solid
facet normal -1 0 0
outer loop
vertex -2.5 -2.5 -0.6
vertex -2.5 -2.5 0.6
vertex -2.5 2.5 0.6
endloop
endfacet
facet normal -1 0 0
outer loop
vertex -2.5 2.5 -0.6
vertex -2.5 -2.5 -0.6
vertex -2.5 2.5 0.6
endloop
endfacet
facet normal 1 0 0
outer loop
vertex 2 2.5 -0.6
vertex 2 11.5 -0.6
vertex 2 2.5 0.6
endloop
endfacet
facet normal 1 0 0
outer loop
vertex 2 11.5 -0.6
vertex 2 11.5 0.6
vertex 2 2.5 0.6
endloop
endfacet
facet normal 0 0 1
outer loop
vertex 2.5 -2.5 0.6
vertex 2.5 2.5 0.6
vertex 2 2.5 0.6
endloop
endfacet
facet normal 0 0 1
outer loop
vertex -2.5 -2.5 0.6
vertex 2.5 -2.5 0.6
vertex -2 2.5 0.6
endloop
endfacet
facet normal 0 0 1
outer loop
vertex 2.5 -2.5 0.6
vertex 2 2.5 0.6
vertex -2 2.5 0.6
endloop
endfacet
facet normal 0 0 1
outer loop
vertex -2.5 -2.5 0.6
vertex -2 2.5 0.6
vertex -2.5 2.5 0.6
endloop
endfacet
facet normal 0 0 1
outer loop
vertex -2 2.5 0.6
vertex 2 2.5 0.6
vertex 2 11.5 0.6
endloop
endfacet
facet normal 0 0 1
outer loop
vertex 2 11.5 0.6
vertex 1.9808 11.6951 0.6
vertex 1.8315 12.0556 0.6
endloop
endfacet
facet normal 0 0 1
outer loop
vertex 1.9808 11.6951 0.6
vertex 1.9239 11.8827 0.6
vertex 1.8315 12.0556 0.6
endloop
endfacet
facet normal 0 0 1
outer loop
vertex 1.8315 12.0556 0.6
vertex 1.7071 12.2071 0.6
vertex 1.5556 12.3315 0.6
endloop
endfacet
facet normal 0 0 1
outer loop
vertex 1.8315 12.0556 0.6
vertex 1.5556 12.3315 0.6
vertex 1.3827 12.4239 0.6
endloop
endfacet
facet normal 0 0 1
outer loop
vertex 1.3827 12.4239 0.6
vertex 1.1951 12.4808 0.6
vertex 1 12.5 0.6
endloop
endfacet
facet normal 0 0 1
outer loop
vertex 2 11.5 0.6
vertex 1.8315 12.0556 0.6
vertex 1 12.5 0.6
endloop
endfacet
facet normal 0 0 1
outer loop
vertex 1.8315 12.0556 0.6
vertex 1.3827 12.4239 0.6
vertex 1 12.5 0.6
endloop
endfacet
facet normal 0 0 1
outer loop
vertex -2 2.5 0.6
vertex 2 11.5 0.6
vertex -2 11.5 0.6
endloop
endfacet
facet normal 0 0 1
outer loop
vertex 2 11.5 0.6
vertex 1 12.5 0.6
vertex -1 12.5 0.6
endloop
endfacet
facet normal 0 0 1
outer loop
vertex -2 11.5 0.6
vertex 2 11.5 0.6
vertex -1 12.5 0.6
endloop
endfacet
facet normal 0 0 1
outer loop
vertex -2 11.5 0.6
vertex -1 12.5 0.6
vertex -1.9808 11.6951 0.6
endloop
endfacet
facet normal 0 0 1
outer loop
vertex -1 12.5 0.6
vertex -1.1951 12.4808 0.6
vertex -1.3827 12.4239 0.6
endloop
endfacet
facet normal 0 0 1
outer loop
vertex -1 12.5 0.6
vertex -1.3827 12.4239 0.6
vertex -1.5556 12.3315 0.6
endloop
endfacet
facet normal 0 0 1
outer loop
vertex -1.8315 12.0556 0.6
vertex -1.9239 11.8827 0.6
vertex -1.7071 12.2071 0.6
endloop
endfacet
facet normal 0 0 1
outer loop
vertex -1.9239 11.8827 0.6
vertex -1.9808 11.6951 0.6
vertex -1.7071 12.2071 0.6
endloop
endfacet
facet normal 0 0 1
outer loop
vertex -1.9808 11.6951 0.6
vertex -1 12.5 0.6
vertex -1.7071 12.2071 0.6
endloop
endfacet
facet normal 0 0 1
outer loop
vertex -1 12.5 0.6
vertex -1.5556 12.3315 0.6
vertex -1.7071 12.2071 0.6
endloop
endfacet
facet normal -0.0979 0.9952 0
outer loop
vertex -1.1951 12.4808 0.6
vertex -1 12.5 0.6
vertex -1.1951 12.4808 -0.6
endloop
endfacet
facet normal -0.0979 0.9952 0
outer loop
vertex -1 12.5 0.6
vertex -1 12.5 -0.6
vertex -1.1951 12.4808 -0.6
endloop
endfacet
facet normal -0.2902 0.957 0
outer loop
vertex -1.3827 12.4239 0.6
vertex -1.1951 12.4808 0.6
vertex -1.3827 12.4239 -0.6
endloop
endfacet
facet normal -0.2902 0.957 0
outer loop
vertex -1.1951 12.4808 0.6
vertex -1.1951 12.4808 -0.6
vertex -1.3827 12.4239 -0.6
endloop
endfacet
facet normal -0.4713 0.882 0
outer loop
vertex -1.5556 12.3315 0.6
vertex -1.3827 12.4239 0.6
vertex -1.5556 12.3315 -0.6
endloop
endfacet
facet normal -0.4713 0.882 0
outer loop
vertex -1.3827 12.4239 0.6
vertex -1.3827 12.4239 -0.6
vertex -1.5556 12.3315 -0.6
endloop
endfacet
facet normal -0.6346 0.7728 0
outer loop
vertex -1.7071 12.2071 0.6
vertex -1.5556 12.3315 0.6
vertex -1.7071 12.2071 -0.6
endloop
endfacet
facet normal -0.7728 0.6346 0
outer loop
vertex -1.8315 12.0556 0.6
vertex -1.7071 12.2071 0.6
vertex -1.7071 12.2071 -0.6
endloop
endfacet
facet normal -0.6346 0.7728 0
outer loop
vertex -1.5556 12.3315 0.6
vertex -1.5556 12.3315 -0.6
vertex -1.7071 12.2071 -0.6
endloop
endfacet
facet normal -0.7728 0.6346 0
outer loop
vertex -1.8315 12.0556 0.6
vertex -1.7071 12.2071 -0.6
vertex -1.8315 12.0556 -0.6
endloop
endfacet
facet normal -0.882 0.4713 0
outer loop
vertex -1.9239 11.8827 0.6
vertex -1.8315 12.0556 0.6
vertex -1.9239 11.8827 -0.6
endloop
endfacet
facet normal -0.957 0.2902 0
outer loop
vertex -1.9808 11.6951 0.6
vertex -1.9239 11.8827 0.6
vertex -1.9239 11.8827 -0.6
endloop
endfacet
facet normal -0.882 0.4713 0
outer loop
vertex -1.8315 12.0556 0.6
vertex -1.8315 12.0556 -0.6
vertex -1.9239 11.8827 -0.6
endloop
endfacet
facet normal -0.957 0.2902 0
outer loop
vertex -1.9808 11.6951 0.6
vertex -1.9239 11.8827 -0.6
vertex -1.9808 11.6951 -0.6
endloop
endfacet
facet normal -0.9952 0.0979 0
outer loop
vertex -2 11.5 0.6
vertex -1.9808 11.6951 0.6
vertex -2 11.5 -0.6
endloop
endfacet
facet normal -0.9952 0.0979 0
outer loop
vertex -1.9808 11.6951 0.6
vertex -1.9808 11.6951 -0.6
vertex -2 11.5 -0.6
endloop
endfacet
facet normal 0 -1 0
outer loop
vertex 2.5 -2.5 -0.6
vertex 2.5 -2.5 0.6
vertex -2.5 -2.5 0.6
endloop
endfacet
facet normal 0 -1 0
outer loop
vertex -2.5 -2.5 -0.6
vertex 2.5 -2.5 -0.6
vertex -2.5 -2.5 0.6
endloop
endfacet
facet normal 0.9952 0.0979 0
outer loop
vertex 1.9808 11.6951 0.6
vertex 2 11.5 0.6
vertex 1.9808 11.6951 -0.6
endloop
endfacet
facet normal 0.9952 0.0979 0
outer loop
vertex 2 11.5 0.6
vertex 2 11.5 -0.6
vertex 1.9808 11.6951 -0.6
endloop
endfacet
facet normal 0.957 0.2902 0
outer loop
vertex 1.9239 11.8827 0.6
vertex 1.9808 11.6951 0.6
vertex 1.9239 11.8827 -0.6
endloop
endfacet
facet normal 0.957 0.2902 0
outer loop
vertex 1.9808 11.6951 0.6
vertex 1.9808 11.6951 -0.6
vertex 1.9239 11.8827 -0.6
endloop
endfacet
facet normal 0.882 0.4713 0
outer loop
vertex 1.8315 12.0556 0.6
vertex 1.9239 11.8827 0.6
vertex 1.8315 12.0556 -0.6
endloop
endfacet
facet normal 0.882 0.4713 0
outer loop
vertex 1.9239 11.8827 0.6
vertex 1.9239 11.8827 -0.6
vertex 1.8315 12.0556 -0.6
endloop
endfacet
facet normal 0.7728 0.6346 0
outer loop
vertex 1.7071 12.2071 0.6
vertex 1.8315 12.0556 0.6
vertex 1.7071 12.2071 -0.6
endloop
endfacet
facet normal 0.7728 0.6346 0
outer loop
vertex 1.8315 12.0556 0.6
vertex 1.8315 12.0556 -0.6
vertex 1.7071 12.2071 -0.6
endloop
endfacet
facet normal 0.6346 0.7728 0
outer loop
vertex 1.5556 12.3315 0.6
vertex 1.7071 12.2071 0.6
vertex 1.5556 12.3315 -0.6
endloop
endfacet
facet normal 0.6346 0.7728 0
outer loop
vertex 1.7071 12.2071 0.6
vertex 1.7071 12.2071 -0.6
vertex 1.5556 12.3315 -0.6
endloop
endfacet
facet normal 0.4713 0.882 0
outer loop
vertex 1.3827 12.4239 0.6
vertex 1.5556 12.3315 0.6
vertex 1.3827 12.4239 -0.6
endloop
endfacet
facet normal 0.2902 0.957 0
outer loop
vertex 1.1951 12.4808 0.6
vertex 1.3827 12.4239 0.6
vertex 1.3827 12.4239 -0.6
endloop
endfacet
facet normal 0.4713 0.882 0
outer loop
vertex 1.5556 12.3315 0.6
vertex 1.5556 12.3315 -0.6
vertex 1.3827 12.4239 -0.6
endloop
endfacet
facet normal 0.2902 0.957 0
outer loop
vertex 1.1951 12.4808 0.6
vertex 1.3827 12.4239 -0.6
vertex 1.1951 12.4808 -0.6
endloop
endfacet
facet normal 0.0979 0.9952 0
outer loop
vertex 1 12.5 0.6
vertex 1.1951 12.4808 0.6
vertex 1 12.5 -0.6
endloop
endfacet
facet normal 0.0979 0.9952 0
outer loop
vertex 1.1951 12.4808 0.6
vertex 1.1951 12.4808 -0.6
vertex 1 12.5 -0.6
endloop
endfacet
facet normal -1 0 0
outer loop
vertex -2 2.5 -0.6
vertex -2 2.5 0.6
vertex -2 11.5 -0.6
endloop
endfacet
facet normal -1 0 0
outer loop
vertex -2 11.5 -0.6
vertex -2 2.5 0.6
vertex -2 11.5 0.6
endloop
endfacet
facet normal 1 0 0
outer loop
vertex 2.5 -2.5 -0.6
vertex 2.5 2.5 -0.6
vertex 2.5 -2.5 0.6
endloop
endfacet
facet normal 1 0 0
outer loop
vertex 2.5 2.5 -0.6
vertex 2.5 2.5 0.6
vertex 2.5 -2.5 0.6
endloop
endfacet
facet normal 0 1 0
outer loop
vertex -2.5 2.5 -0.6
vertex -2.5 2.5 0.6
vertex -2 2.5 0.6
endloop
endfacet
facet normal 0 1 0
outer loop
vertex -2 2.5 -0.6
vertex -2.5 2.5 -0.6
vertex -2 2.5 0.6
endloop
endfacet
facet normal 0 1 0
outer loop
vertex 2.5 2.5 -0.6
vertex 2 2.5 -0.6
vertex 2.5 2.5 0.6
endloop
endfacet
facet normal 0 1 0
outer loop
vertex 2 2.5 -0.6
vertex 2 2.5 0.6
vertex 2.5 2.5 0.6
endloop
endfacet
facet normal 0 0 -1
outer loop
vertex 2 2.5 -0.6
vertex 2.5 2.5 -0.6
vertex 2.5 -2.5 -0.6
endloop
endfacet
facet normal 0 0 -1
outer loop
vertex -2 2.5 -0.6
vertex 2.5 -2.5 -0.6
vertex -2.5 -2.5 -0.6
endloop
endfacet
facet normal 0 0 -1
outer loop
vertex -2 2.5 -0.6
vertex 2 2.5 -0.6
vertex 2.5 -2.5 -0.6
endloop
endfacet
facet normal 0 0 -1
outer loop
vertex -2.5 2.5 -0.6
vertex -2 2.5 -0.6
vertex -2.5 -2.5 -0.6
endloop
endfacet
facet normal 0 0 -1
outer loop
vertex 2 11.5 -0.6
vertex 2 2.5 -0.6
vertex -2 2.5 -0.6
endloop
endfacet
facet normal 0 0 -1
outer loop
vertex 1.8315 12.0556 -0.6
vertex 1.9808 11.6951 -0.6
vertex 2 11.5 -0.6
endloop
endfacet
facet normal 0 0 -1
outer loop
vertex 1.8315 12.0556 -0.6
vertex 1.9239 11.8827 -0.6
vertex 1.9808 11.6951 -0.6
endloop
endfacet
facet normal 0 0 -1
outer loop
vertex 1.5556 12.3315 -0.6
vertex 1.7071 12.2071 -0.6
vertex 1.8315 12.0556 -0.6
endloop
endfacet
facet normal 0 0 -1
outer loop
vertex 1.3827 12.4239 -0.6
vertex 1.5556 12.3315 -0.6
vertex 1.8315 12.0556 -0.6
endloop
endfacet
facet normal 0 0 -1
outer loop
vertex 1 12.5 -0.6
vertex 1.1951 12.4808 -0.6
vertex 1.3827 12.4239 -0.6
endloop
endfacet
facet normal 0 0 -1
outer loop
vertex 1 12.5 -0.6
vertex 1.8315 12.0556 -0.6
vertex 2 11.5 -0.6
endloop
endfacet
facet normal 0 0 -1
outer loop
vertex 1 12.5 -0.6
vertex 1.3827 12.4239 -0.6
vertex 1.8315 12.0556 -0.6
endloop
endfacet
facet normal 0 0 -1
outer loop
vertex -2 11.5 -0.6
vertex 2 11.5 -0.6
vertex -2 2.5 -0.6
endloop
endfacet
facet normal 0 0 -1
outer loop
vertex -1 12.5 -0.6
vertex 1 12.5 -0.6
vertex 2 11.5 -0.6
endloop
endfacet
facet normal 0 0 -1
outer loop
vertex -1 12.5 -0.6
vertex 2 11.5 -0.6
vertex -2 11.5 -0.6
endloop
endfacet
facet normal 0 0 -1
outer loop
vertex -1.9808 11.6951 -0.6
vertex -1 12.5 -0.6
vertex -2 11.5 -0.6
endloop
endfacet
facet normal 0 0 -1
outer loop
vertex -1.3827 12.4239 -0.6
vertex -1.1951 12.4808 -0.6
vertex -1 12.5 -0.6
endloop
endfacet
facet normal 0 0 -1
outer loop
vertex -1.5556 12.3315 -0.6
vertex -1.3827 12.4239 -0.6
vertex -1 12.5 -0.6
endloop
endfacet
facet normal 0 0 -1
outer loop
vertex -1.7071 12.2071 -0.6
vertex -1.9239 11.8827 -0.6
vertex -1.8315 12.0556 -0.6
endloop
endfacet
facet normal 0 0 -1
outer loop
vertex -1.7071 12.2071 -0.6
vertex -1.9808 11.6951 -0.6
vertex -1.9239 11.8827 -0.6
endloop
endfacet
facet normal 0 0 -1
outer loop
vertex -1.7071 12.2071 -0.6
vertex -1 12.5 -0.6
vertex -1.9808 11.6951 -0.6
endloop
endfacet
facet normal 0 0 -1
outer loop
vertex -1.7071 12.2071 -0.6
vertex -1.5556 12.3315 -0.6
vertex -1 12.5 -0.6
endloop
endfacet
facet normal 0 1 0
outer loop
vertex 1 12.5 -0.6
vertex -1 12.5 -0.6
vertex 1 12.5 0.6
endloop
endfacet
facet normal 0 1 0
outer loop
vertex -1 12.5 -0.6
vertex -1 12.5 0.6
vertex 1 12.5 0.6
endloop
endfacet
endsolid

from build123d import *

# Parameters (mm, degrees)
AUFSATZ_LINEAR_AUSTRAGEN1_DEPTH = 0.6
VERRUNDUNG1_R                   = 1
VERRUNDUNG2_R                   = 1


with BuildPart() as part:
    # glider-sketch → Aufsatz-Linear austragen1 (new body, symmetric)
    with BuildSketch(Plane.XY):
        Polygon((-2.5, 2.5), (-2, 2.5), (-2, 12.5), (2, 12.5), (2, 2.5), (2.5, 2.5), (2.5, -2.5), (-2.5, -2.5), align=None)
    extrude(amount=AUFSATZ_LINEAR_AUSTRAGEN1_DEPTH, both=True)

    # Verrundung1
    verrundung1_edges = [part.edges().sort_by_distance(p)[0] for p in [
        (2, 12.5, 0),
    ]]
    fillet(verrundung1_edges, radius=VERRUNDUNG1_R)

    # Verrundung2
    verrundung2_edges = [part.edges().sort_by_distance(p)[0] for p in [
        (-2, 12.5, 0),
    ]]
    fillet(verrundung2_edges, radius=VERRUNDUNG2_R)


solid = part.part
